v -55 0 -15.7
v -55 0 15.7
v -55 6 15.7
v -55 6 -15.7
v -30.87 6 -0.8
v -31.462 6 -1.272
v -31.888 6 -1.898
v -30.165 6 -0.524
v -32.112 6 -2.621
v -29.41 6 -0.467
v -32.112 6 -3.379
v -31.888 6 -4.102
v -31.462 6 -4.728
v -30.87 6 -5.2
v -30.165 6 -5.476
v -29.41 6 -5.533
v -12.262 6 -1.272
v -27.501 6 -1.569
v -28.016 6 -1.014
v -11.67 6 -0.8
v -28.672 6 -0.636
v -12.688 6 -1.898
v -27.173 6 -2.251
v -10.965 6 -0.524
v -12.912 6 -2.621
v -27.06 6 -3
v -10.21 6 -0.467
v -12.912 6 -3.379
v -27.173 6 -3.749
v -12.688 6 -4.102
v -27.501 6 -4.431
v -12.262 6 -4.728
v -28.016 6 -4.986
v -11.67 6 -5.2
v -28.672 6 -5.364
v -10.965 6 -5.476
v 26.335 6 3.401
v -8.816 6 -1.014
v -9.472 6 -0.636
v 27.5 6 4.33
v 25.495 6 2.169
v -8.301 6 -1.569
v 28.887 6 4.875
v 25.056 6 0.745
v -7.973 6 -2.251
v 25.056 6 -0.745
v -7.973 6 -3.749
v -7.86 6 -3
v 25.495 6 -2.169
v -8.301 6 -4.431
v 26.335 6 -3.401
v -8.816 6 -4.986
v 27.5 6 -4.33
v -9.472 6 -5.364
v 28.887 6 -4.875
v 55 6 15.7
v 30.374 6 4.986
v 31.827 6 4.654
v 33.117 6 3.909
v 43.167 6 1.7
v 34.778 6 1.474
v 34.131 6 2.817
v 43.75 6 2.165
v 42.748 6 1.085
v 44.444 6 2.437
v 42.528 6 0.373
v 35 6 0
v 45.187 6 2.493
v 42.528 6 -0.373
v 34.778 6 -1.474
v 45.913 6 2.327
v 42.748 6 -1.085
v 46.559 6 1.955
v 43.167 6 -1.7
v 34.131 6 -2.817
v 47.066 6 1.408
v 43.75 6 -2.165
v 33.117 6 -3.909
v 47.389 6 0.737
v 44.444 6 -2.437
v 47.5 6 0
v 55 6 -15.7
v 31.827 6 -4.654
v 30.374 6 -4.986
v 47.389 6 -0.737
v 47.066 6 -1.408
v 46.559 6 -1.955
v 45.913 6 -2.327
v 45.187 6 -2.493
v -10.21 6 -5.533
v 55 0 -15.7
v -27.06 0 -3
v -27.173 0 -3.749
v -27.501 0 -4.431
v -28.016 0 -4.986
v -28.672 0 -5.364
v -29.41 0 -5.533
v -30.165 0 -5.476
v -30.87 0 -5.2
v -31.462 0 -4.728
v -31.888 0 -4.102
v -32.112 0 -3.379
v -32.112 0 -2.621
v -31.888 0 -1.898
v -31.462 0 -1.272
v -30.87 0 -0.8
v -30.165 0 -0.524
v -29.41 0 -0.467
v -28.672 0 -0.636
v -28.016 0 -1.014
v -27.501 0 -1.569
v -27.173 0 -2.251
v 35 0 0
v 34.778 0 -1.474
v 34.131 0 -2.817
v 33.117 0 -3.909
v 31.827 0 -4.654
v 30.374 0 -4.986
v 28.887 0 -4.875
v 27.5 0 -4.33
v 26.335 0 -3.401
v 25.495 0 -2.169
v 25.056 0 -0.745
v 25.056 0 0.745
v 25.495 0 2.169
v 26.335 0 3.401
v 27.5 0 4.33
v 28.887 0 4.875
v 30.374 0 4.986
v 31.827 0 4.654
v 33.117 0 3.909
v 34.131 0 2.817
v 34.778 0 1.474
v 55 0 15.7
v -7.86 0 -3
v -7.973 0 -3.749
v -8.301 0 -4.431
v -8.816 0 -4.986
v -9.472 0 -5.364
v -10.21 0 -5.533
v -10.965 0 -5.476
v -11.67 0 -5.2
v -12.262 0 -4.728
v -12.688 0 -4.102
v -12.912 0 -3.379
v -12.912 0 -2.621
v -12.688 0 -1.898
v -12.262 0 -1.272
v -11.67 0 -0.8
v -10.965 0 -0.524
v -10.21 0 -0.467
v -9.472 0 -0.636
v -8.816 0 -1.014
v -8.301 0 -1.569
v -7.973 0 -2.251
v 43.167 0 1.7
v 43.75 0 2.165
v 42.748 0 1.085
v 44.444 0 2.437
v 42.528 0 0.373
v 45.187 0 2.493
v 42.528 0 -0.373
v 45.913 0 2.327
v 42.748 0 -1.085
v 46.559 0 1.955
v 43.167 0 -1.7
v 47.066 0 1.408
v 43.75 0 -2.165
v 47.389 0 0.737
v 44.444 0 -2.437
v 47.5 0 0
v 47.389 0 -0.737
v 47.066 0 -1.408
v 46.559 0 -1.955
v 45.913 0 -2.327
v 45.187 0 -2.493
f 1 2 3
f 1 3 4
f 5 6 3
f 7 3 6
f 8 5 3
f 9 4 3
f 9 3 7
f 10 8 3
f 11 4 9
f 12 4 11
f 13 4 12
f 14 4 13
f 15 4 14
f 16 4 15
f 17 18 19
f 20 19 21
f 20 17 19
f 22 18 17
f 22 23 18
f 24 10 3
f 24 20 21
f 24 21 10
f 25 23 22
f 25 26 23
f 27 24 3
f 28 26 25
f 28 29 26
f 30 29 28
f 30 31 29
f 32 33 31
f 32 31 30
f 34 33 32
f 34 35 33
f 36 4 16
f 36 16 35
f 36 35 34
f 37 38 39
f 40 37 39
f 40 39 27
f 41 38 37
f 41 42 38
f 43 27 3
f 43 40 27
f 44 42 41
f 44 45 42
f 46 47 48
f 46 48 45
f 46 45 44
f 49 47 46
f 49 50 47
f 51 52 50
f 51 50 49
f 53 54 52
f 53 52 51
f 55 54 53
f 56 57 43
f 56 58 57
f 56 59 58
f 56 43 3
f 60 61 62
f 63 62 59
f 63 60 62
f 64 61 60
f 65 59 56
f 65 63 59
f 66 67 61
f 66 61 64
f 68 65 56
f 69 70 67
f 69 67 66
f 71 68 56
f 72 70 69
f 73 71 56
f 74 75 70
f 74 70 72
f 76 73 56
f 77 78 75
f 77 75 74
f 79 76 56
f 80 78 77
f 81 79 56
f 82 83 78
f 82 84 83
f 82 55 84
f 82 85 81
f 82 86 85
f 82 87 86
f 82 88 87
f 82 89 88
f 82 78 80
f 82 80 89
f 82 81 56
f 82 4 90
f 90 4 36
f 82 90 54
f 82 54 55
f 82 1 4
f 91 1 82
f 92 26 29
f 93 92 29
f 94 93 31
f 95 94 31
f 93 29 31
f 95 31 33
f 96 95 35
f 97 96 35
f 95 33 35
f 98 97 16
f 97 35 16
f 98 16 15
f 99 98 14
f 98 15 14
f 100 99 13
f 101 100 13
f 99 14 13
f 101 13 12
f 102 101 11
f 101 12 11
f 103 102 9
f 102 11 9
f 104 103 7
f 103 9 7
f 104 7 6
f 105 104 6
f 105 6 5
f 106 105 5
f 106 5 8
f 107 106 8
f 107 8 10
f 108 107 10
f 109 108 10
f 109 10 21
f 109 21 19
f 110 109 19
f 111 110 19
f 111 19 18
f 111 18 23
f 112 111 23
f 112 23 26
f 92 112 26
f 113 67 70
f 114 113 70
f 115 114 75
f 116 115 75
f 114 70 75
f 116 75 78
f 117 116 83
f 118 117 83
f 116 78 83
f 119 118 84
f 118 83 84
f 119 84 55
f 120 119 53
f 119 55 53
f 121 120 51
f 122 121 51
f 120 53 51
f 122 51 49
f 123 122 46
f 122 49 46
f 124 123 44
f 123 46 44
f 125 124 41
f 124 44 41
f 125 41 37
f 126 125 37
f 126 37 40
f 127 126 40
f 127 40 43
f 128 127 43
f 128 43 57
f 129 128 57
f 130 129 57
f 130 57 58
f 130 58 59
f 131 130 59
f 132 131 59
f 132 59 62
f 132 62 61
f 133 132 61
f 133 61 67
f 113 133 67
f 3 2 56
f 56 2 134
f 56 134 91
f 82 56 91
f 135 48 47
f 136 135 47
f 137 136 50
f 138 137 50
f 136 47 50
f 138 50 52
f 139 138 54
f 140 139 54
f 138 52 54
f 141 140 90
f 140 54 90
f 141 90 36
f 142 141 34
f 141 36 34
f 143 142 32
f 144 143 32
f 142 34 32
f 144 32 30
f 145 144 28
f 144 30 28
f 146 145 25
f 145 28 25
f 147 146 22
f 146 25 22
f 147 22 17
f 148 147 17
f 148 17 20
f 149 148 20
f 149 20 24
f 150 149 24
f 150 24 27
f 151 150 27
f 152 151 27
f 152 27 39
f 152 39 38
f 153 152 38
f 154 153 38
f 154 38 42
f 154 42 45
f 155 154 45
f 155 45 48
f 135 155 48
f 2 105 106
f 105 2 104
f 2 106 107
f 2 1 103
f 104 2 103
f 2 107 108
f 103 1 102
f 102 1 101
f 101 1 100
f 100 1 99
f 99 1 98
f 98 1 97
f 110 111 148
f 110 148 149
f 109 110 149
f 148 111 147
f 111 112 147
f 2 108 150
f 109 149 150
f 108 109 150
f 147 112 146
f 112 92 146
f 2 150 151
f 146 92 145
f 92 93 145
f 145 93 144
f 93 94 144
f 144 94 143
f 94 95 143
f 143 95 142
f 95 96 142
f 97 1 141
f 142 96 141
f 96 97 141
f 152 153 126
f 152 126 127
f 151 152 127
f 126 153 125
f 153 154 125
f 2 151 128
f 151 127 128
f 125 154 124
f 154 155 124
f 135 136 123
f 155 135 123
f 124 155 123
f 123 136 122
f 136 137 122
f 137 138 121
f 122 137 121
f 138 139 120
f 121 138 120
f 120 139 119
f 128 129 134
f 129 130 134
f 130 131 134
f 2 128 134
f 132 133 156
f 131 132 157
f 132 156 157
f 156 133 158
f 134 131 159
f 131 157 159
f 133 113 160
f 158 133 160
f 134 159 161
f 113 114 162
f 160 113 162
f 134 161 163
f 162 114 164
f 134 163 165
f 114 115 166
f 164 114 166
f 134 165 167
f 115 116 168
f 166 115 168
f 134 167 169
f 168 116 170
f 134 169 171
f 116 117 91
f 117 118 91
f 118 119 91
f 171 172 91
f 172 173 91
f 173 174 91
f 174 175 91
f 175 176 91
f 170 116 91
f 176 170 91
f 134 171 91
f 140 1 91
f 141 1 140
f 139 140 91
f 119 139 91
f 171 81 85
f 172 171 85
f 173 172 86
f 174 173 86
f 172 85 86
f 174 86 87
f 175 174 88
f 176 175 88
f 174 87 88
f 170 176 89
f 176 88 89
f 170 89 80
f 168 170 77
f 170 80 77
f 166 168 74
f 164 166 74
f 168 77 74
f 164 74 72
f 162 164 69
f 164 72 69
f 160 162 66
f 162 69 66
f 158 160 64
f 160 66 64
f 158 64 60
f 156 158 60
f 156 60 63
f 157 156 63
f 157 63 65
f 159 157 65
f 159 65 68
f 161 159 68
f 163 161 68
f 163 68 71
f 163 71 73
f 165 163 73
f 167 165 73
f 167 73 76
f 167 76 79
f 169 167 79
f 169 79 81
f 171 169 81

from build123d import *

# Parameters (mm, degrees)
SKETCH1_W               = 110
SKETCH1_H               = 31.4
BOSS_EXTRUDE1_DEPTH     = 6
SKETCH2_R               = 2.54
SKETCH2_R_2             = 5
SKETCH2_R_3             = 2.5
CUT_EXTRUDE1_DEPTH      = 1
CUT_EXTRUDE1_DEPTH_BACK = 7


with BuildPart() as part:
    # Sketch1 → Boss-Extrude1 (new body)
    with BuildSketch(Plane(origin=(0, 0, 0), x_dir=(1, 0, 0), z_dir=(0, 1, 0))):
        Rectangle(SKETCH1_W, SKETCH1_H)
    extrude(amount=BOSS_EXTRUDE1_DEPTH)

    # Sketch2 → Cut-Extrude1 (cut, two sides)
    with BuildSketch(Plane(origin=(0, 6, 0), x_dir=(1, 0, 0), z_dir=(0, 1, 0))) as cut_extrude1_sk:
        with Locations((-10.4, 3)):
            Circle(SKETCH2_R)
        with Locations((-29.6, 3)):
            Circle(SKETCH2_R)
        with Locations((30, 0)):
            Circle(SKETCH2_R_2)
        with Locations((45, 0)):
            Circle(SKETCH2_R_3)
    extrude(amount=CUT_EXTRUDE1_DEPTH, mode=Mode.SUBTRACT)
    extrude(cut_extrude1_sk.sketch, amount=-CUT_EXTRUDE1_DEPTH_BACK, mode=Mode.SUBTRACT)


solid = part.part
